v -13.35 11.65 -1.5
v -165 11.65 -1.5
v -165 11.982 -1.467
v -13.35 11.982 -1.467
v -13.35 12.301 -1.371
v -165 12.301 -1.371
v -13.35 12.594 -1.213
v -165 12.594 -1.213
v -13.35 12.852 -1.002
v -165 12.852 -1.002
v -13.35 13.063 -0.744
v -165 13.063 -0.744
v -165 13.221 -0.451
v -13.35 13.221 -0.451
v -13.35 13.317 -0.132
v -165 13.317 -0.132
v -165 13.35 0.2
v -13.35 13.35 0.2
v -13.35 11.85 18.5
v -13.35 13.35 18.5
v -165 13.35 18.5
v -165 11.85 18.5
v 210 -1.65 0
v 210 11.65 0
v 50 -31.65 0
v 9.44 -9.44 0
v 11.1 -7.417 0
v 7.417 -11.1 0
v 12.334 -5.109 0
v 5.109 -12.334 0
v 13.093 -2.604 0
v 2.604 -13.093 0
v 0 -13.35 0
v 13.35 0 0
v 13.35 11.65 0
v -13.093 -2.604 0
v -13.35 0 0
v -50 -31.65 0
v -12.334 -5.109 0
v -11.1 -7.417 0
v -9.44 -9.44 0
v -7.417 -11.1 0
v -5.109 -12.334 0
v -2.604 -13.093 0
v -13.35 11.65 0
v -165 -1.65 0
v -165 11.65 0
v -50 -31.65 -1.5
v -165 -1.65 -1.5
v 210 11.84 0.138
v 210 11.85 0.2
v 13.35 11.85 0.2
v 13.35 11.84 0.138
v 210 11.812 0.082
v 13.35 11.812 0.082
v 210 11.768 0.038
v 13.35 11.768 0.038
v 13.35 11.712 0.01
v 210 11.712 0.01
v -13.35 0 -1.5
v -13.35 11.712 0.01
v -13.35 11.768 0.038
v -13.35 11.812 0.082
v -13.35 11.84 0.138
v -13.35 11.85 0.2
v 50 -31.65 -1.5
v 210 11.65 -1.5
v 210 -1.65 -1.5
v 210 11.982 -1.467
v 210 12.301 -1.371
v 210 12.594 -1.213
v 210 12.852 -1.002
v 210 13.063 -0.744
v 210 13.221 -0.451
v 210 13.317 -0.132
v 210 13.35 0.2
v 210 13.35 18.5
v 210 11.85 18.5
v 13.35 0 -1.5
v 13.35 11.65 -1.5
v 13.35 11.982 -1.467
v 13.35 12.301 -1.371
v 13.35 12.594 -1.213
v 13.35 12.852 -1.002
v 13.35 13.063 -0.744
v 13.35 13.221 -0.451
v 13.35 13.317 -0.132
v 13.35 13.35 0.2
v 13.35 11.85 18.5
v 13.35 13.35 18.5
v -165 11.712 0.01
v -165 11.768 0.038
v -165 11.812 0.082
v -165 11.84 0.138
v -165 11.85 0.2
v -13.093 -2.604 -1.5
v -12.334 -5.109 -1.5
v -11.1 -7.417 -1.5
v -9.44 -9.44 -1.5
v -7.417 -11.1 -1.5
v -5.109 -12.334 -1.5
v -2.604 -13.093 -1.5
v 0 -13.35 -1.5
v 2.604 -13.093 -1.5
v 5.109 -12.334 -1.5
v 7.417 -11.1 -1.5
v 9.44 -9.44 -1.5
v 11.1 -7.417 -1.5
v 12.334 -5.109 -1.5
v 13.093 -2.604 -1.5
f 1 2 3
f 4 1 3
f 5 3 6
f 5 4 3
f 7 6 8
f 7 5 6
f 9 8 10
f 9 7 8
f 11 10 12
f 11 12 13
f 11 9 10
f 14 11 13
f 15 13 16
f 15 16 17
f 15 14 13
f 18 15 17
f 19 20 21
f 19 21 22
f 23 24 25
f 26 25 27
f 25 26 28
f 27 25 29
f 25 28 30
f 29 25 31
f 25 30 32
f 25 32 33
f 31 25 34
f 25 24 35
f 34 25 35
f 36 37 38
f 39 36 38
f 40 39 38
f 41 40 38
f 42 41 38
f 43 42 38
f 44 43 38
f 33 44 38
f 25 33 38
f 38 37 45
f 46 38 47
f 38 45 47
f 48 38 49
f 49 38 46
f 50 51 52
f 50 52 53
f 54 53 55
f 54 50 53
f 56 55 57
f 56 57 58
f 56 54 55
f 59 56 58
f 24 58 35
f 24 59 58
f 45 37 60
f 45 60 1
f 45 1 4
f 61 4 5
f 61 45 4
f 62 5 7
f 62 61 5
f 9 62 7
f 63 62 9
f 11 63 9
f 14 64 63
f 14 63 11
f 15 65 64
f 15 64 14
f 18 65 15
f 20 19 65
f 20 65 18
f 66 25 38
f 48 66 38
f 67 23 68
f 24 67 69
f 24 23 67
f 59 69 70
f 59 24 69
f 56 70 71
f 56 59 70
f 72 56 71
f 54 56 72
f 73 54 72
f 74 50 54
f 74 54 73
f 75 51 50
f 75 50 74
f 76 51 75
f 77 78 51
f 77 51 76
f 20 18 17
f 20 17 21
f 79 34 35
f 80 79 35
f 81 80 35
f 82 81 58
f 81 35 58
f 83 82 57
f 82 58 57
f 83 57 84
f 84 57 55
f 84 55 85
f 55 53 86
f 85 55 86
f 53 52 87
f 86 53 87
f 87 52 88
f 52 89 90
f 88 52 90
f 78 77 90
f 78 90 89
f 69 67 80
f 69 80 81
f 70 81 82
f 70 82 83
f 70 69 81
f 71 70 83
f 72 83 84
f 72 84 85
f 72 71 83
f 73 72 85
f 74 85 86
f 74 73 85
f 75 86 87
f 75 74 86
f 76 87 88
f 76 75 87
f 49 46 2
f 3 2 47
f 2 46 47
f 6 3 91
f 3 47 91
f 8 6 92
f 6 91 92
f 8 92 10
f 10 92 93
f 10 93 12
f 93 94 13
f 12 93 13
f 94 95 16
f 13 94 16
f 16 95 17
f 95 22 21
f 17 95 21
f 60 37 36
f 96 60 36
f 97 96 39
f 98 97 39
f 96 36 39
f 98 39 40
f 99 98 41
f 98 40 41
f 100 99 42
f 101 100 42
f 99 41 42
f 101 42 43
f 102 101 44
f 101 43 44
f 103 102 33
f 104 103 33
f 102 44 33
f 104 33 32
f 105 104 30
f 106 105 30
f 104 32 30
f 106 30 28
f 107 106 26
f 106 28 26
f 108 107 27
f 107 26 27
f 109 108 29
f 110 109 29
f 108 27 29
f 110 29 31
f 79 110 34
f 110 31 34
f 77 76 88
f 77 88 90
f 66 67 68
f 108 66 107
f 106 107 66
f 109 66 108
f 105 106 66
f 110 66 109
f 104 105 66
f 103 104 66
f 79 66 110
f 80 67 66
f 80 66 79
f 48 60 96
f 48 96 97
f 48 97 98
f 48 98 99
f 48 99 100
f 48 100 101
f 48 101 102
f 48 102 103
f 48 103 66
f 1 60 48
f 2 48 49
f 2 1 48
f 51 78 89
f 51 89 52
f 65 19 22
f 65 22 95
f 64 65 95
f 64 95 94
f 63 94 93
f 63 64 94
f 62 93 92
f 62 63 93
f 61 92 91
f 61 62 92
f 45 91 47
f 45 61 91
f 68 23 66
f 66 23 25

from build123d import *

# Parameters (mm, degrees)
BASE_FLANGE1_DEPTH             = 1.5
EDGE_FLANGE1_STRIP_W           = 6.4
EDGE_FLANGE1_STRIP_H           = 1.5
EDGE_FLANGE1_STRIP_CUT_DEPTH   = 151.65
EDGE_FLANGE1_STRIP_2_W         = 6.4
EDGE_FLANGE1_STRIP_2_H         = 1.5
EDGE_FLANGE1_STRIP_CUT_2_DEPTH = 196.65
EDGE_FLANGE1_DEPTH             = 151.65
EDGE_FLANGE1_BEND_DEPTH        = 196.65


# Sheet-metal steps are written as plain solids
with BuildPart() as part:
    # Sketch1 → Base-Flange1 (new body)
    with BuildSketch(Plane.XY):
        with BuildLine():
            Line((13.35, 0), (13.35, 13.35))
            Line((13.35, 13.35), (210, 13.35))
            Line((210, 13.35), (210, -1.65))
            Line((210, -1.65), (50, -31.65))
            Line((50, -31.65), (-50, -31.65))
            Line((-50, -31.65), (-165, -1.65))
            Line((-165, -1.65), (-165, 13.35))
            Line((-165, 13.35), (-13.35, 13.35))
            Line((-13.35, 13.35), (-13.35, 0))
            ThreePointArc((-13.35, 0), (0, -13.35), (13.35, 0))
        make_face()
    extrude(amount=-BASE_FLANGE1_DEPTH)

    # Edge-Flange1 strip (across the edge) → Edge-Flange1 strip cut (cut)
    with BuildSketch(Plane(origin=(-13.35, 13.35, 0), x_dir=(0, -1, 0), z_dir=(-1, 0, 0))):
        with Locations((-1.5, -0.75)):
            Rectangle(EDGE_FLANGE1_STRIP_W, EDGE_FLANGE1_STRIP_H)
    extrude(amount=EDGE_FLANGE1_STRIP_CUT_DEPTH, mode=Mode.SUBTRACT)

    # Edge-Flange1 strip 2 (across the edge) → Edge-Flange1 strip cut 2 (cut)
    with BuildSketch(Plane(origin=(210, 13.35, 0), x_dir=(0, -1, 0), z_dir=(-1, 0, 0))):
        with Locations((-1.5, -0.75)):
            Rectangle(EDGE_FLANGE1_STRIP_2_W, EDGE_FLANGE1_STRIP_2_H)
    extrude(amount=EDGE_FLANGE1_STRIP_CUT_2_DEPTH, mode=Mode.SUBTRACT)

    # Edge-Flange1 section (across the edge) → Edge-Flange1 (add)
    with BuildSketch(Plane(origin=(-13.35, 13.35, 0), x_dir=(0, -1, 0), z_dir=(-1, 0, 0))):
        with BuildLine():
            Line((0, 0.2), (0, 18.5))
            Line((0, 18.5), (1.5, 18.5))
            Line((1.5, 18.5), (1.5, 0.2))
            ThreePointArc((1.5, 0.2), (1.558578644, 0.058578644), (1.7, 0))
            Line((1.7, 0), (1.7, -1.5))
            ThreePointArc((1.7, -1.5), (0.497918472, -1.002081528), (0, 0.2))
        make_face()
    extrude(amount=EDGE_FLANGE1_DEPTH)

    # Edge-Flange1 section 2 (across the edge) → Edge-Flange1 bend (add)
    with BuildSketch(Plane(origin=(210, 13.35, 0), x_dir=(0, -1, 0), z_dir=(-1, 0, 0))):
        with BuildLine():
            Line((0, 0.2), (0, 18.5))
            Line((0, 18.5), (1.5, 18.5))
            Line((1.5, 18.5), (1.5, 0.2))
            ThreePointArc((1.5, 0.2), (1.558578644, 0.058578644), (1.7, 0))
            Line((1.7, 0), (1.7, -1.5))
            ThreePointArc((1.7, -1.5), (0.497918472, -1.002081528), (0, 0.2))
        make_face()
    extrude(amount=EDGE_FLANGE1_BEND_DEPTH)


solid = part.part
